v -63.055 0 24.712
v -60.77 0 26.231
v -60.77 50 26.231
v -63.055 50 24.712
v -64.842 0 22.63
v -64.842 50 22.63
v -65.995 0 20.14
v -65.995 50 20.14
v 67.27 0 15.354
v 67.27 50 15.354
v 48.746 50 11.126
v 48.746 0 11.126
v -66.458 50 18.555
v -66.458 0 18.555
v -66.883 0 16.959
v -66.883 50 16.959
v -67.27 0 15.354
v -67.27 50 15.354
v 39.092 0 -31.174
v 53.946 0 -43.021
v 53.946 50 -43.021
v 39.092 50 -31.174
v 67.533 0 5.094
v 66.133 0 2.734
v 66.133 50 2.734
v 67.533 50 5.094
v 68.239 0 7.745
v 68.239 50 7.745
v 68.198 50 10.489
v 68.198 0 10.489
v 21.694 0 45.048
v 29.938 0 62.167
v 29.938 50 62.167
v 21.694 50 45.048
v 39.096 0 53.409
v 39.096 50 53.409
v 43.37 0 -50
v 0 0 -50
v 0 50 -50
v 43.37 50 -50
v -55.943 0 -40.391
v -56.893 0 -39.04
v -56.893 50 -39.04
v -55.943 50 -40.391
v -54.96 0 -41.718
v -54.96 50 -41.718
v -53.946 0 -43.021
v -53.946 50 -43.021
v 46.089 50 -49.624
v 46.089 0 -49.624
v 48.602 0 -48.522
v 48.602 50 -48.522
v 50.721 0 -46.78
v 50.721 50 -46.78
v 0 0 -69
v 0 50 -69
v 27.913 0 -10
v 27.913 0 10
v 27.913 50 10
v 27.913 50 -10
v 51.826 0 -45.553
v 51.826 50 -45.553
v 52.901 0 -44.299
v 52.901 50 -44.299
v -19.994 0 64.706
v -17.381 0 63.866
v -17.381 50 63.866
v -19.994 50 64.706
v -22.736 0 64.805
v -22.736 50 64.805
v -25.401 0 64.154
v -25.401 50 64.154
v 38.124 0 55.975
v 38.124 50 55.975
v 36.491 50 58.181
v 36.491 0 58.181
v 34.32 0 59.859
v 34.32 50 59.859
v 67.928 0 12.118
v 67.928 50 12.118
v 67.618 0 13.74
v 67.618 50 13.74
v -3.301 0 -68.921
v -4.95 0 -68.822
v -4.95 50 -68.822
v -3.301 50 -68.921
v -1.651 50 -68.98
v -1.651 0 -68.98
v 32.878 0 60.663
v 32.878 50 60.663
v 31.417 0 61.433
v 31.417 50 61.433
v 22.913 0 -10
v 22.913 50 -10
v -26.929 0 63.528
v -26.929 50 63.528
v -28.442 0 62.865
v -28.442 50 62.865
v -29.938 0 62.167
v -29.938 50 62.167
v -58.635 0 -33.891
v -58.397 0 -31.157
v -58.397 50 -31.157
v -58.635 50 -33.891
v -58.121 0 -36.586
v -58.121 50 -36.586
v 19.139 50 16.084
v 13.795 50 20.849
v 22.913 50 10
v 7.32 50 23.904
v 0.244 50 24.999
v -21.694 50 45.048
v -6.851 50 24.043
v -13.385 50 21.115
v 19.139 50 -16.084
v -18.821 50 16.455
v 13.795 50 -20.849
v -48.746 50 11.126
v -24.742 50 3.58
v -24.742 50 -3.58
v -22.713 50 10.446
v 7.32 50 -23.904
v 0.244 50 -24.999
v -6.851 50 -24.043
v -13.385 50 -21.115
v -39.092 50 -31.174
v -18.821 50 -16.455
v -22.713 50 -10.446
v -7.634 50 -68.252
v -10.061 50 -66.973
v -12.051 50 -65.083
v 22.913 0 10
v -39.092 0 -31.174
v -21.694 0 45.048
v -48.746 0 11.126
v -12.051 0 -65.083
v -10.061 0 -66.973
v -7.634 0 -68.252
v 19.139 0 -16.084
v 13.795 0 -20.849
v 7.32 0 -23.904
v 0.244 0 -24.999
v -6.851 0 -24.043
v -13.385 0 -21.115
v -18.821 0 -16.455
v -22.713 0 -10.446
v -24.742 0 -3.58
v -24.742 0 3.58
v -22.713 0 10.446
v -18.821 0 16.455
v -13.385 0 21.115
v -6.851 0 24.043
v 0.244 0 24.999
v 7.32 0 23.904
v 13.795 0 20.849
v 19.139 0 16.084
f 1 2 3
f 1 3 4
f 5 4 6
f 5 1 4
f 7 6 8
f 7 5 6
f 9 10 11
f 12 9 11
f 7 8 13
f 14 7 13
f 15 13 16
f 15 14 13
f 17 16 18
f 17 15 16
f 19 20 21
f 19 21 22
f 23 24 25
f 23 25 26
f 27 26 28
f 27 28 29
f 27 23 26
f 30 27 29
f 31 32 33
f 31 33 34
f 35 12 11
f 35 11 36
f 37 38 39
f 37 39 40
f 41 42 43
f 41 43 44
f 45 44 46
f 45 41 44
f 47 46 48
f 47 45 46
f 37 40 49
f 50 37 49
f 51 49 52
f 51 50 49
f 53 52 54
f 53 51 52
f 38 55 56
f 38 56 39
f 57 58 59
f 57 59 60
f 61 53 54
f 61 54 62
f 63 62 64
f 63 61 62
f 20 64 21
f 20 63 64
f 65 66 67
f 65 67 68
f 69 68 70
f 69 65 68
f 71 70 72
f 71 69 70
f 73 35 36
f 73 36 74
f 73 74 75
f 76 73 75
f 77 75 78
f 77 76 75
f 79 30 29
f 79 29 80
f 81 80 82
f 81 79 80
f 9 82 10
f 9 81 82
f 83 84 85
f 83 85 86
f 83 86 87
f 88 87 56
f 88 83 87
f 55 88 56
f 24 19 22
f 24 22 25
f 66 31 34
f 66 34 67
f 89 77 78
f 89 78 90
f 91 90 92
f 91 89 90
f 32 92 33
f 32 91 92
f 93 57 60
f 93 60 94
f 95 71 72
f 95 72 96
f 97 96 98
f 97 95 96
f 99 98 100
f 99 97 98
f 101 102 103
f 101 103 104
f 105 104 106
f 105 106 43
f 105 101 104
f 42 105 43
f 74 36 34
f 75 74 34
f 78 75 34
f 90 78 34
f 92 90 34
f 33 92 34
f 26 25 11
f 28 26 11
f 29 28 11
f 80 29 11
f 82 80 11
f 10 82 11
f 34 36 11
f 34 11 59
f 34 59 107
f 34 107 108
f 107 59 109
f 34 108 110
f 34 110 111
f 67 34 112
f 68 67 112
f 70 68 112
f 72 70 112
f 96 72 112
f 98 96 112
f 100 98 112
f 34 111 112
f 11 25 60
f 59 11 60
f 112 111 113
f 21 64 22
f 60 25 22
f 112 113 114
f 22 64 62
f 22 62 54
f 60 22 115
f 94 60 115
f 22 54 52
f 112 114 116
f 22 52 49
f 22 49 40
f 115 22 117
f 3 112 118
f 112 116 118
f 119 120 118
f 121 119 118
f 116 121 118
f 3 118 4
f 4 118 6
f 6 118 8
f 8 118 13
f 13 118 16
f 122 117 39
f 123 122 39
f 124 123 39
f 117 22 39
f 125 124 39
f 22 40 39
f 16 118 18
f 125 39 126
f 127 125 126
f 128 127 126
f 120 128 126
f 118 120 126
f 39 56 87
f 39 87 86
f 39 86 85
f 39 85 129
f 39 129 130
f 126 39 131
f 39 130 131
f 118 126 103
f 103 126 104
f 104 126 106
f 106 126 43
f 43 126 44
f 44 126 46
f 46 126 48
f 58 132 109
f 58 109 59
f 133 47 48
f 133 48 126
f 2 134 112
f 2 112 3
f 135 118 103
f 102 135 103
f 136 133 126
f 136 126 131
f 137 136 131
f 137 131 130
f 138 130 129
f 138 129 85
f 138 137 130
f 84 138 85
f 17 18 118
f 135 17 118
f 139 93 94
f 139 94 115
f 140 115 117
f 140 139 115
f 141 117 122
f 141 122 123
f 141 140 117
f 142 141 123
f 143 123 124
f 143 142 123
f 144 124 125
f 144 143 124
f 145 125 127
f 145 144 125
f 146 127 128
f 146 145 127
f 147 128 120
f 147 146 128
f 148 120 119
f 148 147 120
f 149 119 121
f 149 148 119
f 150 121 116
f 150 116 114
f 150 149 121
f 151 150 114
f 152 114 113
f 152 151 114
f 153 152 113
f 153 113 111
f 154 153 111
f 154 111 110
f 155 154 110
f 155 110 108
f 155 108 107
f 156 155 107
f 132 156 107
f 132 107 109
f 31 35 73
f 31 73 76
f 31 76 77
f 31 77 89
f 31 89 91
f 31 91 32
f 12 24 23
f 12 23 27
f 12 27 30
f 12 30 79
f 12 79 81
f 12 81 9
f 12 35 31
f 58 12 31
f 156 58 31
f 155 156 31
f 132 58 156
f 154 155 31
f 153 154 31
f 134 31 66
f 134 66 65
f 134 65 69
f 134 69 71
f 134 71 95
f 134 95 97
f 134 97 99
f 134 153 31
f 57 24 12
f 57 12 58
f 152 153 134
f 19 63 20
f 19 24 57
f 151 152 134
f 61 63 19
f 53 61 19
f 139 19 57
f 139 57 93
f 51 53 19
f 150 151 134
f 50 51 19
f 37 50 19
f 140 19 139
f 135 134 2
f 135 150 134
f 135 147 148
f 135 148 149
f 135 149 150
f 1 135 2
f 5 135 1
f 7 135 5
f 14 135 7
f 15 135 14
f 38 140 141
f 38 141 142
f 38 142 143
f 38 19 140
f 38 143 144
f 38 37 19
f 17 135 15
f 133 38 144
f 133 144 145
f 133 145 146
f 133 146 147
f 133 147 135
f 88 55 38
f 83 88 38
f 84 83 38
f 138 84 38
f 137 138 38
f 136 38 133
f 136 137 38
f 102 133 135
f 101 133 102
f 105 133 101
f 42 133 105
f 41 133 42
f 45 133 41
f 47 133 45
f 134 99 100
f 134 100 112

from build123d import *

# Parameters (mm, degrees)
BOSS_EXTRUDE1_DEPTH = 50


with BuildPart() as part:
    # Sketch1 → Boss-Extrude1 (new body)
    with BuildSketch(Plane(origin=(0, 0, 0), x_dir=(1, 0, 0), z_dir=(0, 1, 0))):
        with BuildLine():
            Line((0, 50), (43.370496884, 50))
            ThreePointArc((43.370496884, 50), (47.383188614, 49.159601797), (50.72142856, 46.779661017))
            ThreePointArc((50.72142856, 46.779661017), (52.367636949, 44.929173155), (53.94637229, 43.020796328))
            Line((53.94637229, 43.020796328), (39.091574123, 31.174490093))
            Line((39.091574123, 31.174490093), (66.132636632, -2.733929782))
            ThreePointArc((66.132636632, -2.733929782), (67.977459231, -6.395158214), (68.198105165, -10.488968105))
            ThreePointArc((68.198105165, -10.488968105), (67.777729639, -12.929785961), (67.270025941, -15.353944443))
            Line((67.270025941, -15.353944443), (48.746395609, -11.126046698))
            Line((48.746395609, -11.126046698), (39.095552136, -53.409154676))
            ThreePointArc((39.095552136, -53.409154676), (37.38331656, -57.134233653), (34.320217593, -59.859190308))
            ThreePointArc((34.320217593, -59.859190308), (32.149809497, -61.052352529), (29.937977999, -62.166851885))
            Line((29.937977999, -62.166851885), (21.694186956, -45.048443395))
            Line((21.694186956, -45.048443395), (-17.381280522, -63.866196751))
            ThreePointArc((-17.381280522, -63.866196751), (-21.361225962, -64.850065825), (-25.401493831, -64.154221304))
            ThreePointArc((-25.401493831, -64.154221304), (-27.687572933, -63.201252401), (-29.937977999, -62.166851885))
            Line((-29.937977999, -62.166851885), (-21.694186956, -45.048443395))
            Line((-21.694186956, -45.048443395), (-60.769654434, -26.23069004))
            ThreePointArc((-60.769654434, -26.23069004), (-64.020329644, -23.732475731), (-65.995362305, -20.13981515))
            ThreePointArc((-65.995362305, -20.13981515), (-66.675648221, -17.758320145), (-67.270025941, -15.353944443))
            Line((-67.270025941, -15.353944443), (-48.746395609, -11.126046698))
            Line((-48.746395609, -11.126046698), (-58.397239082, 31.15706128))
            ThreePointArc((-58.397239082, 31.15706128), (-58.470819328, 35.256152643), (-56.893376903, 39.040282589))
            ThreePointArc((-56.893376903, 39.040282589), (-55.455600463, 41.056989384), (-53.94637229, 43.020796328))
            Line((-53.94637229, 43.020796328), (-39.091574123, 31.174490093))
            Line((-39.091574123, 31.174490093), (-12.050511614, 65.082909967))
            ThreePointArc((-12.050511614, 65.082909967), (-8.89158947, 67.696178982), (-4.94951828, 68.822251262))
            ThreePointArc((-4.94951828, 68.822251262), (-2.476354468, 68.955548497), (0, 69))
            Line((0, 69), (0, 50))
        make_face()
        with BuildLine():
            Line((27.912878475, -10), (27.912878475, 10))
            Line((27.912878475, 10), (22.912878475, 10))
            ThreePointArc((22.912878475, 10), (-25, 0), (22.912878475, -10))
            Line((22.912878475, -10), (27.912878475, -10))
        make_face(mode=Mode.SUBTRACT)
    extrude(amount=BOSS_EXTRUDE1_DEPTH)


solid = part.part
